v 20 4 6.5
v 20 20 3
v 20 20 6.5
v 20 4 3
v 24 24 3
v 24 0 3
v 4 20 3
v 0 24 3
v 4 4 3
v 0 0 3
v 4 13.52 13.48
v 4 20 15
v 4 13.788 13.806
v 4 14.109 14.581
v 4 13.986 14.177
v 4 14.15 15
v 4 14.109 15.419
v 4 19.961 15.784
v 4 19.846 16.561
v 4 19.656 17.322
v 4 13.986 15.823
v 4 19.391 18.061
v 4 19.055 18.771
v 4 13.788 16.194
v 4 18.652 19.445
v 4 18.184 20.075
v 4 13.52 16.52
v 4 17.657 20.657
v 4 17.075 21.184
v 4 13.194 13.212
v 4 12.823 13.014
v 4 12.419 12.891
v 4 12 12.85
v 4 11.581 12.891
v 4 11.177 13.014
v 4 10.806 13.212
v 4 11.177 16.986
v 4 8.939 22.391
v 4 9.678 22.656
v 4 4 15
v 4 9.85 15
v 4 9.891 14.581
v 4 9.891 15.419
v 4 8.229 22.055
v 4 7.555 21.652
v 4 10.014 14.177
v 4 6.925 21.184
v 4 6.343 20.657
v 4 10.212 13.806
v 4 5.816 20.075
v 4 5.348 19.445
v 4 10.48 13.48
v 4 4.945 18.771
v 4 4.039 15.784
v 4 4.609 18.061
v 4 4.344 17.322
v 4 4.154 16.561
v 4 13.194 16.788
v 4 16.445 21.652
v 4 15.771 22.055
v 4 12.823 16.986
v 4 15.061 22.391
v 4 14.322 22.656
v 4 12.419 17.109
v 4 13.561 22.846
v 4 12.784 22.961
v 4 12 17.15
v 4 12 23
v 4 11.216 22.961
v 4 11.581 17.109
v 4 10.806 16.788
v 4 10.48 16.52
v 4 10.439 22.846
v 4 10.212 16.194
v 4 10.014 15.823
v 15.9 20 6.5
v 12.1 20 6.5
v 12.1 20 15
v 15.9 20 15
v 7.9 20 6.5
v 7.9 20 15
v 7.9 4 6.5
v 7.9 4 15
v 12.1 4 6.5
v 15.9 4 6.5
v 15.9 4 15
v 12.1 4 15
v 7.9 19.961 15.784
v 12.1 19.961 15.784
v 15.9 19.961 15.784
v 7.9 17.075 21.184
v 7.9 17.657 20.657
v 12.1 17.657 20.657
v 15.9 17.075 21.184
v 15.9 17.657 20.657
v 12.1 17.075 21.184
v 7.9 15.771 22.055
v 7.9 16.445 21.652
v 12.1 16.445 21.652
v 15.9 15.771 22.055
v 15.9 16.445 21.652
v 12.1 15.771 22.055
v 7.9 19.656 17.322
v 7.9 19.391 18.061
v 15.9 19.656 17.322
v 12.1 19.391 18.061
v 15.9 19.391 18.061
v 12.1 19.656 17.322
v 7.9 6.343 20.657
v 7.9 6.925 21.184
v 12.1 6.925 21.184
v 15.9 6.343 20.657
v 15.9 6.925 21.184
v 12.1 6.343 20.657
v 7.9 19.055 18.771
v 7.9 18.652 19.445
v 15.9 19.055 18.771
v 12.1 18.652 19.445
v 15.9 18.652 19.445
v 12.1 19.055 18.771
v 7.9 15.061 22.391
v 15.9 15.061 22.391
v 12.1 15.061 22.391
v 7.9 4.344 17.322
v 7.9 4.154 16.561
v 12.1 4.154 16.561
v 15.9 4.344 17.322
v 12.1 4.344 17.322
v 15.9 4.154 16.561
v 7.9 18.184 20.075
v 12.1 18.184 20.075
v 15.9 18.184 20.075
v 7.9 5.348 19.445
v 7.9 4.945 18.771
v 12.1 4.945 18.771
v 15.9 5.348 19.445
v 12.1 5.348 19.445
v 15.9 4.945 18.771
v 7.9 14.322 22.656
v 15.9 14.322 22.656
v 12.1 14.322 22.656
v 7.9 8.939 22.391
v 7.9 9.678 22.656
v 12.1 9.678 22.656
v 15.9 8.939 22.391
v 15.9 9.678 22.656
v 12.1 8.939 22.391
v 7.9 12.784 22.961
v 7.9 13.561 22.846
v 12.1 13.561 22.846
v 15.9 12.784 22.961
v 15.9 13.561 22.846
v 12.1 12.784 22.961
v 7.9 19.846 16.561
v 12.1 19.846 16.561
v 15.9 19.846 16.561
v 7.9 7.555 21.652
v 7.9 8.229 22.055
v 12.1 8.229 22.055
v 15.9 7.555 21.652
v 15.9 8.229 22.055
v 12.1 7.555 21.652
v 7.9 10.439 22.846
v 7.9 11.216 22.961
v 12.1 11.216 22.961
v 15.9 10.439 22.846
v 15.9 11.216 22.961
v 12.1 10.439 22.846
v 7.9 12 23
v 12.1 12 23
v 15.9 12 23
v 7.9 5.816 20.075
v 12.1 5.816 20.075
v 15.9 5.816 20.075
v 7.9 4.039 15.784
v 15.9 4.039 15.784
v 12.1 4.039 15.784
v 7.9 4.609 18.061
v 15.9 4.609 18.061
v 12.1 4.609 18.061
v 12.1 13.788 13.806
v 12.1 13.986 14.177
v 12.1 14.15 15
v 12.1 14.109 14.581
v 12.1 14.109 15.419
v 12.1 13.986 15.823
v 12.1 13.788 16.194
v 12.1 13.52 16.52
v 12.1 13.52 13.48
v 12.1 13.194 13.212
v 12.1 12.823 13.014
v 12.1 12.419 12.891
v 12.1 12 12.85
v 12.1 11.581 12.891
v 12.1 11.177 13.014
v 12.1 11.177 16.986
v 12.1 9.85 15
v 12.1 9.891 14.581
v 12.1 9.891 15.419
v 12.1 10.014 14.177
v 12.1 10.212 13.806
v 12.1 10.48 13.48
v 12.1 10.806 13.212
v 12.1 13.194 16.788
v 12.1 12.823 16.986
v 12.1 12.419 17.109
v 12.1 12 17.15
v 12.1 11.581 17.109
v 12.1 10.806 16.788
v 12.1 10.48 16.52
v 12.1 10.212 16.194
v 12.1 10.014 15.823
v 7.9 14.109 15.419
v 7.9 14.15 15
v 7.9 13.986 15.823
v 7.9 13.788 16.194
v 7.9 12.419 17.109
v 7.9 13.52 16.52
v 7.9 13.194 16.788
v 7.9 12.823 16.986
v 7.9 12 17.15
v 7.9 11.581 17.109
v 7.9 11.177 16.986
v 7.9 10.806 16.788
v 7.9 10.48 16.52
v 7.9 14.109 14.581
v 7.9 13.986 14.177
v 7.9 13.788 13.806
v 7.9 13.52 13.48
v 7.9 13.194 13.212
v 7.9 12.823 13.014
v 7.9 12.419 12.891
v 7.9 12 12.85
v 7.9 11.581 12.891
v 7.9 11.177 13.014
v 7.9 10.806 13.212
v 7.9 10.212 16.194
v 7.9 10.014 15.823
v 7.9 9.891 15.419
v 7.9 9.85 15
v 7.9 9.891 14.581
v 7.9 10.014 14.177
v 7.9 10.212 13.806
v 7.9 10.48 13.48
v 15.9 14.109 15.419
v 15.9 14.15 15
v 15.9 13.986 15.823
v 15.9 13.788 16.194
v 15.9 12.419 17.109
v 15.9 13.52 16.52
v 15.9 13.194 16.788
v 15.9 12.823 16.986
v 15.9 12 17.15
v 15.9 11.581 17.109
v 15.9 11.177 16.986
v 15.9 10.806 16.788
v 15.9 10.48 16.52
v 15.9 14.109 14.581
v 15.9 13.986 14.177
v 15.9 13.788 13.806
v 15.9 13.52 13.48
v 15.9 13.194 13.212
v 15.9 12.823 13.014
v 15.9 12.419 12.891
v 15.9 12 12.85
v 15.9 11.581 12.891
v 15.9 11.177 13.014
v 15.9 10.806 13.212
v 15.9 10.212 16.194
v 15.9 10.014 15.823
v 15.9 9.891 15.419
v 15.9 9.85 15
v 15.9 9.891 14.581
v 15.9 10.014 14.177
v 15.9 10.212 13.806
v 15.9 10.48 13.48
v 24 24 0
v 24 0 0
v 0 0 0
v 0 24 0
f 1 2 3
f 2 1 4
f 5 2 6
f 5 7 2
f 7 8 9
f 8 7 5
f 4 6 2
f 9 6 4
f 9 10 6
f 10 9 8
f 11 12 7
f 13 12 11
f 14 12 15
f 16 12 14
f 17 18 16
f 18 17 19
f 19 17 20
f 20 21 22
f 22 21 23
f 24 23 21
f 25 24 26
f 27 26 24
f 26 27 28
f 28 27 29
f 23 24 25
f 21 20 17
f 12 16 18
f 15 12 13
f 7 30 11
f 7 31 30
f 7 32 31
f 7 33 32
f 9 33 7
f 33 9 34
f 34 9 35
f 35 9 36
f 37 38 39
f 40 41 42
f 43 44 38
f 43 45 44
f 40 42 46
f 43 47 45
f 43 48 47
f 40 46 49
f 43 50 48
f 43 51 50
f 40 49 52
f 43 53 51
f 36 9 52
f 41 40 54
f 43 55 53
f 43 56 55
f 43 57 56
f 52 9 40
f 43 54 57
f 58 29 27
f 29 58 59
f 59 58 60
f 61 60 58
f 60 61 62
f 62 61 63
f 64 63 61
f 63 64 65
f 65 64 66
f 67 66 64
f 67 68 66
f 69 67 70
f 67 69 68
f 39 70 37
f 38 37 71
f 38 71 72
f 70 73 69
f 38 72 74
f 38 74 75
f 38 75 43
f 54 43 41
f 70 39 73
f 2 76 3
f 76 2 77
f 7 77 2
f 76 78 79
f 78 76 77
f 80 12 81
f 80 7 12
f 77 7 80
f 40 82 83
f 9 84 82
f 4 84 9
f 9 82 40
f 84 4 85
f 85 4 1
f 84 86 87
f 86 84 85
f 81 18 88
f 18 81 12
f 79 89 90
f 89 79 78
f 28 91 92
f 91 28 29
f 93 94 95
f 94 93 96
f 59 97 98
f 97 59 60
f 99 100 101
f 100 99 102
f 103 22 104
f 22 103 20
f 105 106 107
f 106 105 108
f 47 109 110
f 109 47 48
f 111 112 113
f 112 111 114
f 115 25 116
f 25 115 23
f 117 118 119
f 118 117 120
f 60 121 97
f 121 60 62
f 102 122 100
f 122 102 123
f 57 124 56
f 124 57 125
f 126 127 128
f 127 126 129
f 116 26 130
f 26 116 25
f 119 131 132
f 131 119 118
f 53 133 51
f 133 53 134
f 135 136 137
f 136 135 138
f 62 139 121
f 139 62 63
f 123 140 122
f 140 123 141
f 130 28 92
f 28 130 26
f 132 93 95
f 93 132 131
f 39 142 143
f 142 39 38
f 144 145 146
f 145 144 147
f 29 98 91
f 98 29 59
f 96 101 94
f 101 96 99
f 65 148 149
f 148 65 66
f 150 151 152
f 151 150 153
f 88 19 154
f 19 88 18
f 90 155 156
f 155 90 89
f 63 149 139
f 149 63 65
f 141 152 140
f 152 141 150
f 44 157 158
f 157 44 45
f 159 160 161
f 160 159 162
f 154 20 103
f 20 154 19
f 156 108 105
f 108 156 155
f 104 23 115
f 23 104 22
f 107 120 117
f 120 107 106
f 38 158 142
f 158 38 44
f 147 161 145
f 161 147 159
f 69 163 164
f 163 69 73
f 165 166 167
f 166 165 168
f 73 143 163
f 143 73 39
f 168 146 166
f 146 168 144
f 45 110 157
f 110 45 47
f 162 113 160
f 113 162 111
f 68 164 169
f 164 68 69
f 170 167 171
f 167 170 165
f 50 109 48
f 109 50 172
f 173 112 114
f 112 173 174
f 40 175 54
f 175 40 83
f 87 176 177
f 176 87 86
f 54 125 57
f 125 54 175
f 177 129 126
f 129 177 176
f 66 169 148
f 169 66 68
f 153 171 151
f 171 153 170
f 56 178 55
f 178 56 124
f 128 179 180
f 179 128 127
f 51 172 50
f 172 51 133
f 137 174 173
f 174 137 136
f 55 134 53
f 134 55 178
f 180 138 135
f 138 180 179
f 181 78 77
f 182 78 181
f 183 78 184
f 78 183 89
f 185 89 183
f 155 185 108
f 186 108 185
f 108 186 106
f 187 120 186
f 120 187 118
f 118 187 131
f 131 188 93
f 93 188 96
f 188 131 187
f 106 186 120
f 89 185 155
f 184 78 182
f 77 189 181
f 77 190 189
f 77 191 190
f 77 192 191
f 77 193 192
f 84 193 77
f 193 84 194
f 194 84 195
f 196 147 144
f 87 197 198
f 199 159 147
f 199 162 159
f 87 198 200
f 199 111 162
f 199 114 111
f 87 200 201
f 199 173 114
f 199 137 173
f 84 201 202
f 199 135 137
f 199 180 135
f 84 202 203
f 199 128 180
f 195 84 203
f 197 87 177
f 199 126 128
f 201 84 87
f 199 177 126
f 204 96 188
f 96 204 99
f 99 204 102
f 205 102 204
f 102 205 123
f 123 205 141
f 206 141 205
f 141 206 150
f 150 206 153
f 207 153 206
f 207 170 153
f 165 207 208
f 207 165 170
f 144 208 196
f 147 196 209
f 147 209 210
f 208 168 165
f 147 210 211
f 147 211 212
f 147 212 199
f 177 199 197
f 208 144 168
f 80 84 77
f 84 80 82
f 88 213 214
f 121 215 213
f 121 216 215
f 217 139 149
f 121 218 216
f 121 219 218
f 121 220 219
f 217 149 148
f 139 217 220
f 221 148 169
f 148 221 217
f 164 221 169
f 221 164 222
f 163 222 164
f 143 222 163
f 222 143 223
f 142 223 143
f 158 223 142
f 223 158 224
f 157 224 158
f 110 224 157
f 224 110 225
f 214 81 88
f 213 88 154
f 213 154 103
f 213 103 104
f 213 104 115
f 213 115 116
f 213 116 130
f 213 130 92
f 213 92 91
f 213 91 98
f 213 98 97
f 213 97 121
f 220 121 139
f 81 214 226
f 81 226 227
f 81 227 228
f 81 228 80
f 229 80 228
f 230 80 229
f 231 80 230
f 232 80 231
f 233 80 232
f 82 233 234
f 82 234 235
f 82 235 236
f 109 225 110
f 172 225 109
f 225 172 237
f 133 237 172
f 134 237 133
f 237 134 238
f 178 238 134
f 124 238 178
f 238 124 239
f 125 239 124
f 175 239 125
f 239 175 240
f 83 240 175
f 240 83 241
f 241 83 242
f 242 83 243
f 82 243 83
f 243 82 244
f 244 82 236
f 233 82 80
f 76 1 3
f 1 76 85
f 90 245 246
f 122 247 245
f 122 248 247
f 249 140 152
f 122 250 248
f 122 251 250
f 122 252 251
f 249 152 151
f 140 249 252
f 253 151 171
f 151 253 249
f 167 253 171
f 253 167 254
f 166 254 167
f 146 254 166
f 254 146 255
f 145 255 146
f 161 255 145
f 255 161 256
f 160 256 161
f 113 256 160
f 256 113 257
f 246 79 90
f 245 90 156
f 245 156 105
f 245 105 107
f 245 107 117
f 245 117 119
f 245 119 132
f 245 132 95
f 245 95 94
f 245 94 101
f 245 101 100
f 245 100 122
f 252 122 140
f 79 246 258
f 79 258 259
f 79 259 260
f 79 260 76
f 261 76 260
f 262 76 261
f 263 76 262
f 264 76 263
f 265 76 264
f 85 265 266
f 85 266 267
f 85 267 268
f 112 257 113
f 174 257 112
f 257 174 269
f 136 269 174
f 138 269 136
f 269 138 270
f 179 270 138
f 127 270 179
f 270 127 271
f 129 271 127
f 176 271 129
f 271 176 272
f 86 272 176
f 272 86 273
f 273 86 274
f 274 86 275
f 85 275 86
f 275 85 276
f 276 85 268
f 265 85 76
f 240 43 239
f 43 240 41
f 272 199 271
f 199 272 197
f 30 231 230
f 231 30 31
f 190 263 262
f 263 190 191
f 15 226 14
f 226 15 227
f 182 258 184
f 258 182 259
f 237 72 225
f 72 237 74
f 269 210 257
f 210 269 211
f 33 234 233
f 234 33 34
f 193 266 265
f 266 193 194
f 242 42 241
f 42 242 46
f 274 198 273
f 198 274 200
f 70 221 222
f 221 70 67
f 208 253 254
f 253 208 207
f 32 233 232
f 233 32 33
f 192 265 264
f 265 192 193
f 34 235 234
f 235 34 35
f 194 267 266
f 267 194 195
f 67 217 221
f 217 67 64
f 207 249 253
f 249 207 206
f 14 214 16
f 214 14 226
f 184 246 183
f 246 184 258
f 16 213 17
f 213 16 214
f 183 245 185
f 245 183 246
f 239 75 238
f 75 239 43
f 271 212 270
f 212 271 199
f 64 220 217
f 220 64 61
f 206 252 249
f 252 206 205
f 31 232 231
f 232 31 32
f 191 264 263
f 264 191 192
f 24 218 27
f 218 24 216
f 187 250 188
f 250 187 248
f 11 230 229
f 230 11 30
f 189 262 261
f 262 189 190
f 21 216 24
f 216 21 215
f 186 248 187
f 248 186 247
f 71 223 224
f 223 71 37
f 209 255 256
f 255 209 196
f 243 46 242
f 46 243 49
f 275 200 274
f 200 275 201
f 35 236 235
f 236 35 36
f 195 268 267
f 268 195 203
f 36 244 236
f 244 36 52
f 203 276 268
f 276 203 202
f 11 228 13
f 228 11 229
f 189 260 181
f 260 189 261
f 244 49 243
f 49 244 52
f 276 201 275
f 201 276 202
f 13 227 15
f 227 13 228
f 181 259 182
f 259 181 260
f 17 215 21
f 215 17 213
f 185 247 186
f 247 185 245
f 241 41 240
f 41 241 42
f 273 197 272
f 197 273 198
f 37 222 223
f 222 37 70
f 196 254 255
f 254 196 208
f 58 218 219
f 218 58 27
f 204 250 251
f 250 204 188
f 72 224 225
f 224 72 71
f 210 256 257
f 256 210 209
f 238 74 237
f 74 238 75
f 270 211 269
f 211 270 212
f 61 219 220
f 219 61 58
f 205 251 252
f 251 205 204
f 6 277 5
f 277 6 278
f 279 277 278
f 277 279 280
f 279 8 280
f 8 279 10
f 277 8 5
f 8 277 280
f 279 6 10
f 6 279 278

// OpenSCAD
union() {
	cube(size = [24, 24, 3]);
	translate(v = [4, 4, 3]) {
		difference() {
			union() {
				cube(size = [16, 16, 12]);
				translate(v = [0, 8, 12]) {
					rotate(a = 90, v = [0, 1, 0]) {
						cylinder($fn = 64, h = 16, r = 8);
					}
				}
			}
			union() {
				translate(v = [3.9000000000, 0, 3.5000000000]) {
					cube(size = [4.2000000000, 16, 25]);
				}
				translate(v = [11.9000000000, 0, 3.5000000000]) {
					cube(size = [4.2000000000, 16, 25]);
				}
				translate(v = [0, 8, 12]) {
					rotate(a = 90, v = [0, 1, 0]) {
						cylinder($fn = 32, h = 16, r = 2.1500000000);
					}
				}
			}
		}
	}
}
